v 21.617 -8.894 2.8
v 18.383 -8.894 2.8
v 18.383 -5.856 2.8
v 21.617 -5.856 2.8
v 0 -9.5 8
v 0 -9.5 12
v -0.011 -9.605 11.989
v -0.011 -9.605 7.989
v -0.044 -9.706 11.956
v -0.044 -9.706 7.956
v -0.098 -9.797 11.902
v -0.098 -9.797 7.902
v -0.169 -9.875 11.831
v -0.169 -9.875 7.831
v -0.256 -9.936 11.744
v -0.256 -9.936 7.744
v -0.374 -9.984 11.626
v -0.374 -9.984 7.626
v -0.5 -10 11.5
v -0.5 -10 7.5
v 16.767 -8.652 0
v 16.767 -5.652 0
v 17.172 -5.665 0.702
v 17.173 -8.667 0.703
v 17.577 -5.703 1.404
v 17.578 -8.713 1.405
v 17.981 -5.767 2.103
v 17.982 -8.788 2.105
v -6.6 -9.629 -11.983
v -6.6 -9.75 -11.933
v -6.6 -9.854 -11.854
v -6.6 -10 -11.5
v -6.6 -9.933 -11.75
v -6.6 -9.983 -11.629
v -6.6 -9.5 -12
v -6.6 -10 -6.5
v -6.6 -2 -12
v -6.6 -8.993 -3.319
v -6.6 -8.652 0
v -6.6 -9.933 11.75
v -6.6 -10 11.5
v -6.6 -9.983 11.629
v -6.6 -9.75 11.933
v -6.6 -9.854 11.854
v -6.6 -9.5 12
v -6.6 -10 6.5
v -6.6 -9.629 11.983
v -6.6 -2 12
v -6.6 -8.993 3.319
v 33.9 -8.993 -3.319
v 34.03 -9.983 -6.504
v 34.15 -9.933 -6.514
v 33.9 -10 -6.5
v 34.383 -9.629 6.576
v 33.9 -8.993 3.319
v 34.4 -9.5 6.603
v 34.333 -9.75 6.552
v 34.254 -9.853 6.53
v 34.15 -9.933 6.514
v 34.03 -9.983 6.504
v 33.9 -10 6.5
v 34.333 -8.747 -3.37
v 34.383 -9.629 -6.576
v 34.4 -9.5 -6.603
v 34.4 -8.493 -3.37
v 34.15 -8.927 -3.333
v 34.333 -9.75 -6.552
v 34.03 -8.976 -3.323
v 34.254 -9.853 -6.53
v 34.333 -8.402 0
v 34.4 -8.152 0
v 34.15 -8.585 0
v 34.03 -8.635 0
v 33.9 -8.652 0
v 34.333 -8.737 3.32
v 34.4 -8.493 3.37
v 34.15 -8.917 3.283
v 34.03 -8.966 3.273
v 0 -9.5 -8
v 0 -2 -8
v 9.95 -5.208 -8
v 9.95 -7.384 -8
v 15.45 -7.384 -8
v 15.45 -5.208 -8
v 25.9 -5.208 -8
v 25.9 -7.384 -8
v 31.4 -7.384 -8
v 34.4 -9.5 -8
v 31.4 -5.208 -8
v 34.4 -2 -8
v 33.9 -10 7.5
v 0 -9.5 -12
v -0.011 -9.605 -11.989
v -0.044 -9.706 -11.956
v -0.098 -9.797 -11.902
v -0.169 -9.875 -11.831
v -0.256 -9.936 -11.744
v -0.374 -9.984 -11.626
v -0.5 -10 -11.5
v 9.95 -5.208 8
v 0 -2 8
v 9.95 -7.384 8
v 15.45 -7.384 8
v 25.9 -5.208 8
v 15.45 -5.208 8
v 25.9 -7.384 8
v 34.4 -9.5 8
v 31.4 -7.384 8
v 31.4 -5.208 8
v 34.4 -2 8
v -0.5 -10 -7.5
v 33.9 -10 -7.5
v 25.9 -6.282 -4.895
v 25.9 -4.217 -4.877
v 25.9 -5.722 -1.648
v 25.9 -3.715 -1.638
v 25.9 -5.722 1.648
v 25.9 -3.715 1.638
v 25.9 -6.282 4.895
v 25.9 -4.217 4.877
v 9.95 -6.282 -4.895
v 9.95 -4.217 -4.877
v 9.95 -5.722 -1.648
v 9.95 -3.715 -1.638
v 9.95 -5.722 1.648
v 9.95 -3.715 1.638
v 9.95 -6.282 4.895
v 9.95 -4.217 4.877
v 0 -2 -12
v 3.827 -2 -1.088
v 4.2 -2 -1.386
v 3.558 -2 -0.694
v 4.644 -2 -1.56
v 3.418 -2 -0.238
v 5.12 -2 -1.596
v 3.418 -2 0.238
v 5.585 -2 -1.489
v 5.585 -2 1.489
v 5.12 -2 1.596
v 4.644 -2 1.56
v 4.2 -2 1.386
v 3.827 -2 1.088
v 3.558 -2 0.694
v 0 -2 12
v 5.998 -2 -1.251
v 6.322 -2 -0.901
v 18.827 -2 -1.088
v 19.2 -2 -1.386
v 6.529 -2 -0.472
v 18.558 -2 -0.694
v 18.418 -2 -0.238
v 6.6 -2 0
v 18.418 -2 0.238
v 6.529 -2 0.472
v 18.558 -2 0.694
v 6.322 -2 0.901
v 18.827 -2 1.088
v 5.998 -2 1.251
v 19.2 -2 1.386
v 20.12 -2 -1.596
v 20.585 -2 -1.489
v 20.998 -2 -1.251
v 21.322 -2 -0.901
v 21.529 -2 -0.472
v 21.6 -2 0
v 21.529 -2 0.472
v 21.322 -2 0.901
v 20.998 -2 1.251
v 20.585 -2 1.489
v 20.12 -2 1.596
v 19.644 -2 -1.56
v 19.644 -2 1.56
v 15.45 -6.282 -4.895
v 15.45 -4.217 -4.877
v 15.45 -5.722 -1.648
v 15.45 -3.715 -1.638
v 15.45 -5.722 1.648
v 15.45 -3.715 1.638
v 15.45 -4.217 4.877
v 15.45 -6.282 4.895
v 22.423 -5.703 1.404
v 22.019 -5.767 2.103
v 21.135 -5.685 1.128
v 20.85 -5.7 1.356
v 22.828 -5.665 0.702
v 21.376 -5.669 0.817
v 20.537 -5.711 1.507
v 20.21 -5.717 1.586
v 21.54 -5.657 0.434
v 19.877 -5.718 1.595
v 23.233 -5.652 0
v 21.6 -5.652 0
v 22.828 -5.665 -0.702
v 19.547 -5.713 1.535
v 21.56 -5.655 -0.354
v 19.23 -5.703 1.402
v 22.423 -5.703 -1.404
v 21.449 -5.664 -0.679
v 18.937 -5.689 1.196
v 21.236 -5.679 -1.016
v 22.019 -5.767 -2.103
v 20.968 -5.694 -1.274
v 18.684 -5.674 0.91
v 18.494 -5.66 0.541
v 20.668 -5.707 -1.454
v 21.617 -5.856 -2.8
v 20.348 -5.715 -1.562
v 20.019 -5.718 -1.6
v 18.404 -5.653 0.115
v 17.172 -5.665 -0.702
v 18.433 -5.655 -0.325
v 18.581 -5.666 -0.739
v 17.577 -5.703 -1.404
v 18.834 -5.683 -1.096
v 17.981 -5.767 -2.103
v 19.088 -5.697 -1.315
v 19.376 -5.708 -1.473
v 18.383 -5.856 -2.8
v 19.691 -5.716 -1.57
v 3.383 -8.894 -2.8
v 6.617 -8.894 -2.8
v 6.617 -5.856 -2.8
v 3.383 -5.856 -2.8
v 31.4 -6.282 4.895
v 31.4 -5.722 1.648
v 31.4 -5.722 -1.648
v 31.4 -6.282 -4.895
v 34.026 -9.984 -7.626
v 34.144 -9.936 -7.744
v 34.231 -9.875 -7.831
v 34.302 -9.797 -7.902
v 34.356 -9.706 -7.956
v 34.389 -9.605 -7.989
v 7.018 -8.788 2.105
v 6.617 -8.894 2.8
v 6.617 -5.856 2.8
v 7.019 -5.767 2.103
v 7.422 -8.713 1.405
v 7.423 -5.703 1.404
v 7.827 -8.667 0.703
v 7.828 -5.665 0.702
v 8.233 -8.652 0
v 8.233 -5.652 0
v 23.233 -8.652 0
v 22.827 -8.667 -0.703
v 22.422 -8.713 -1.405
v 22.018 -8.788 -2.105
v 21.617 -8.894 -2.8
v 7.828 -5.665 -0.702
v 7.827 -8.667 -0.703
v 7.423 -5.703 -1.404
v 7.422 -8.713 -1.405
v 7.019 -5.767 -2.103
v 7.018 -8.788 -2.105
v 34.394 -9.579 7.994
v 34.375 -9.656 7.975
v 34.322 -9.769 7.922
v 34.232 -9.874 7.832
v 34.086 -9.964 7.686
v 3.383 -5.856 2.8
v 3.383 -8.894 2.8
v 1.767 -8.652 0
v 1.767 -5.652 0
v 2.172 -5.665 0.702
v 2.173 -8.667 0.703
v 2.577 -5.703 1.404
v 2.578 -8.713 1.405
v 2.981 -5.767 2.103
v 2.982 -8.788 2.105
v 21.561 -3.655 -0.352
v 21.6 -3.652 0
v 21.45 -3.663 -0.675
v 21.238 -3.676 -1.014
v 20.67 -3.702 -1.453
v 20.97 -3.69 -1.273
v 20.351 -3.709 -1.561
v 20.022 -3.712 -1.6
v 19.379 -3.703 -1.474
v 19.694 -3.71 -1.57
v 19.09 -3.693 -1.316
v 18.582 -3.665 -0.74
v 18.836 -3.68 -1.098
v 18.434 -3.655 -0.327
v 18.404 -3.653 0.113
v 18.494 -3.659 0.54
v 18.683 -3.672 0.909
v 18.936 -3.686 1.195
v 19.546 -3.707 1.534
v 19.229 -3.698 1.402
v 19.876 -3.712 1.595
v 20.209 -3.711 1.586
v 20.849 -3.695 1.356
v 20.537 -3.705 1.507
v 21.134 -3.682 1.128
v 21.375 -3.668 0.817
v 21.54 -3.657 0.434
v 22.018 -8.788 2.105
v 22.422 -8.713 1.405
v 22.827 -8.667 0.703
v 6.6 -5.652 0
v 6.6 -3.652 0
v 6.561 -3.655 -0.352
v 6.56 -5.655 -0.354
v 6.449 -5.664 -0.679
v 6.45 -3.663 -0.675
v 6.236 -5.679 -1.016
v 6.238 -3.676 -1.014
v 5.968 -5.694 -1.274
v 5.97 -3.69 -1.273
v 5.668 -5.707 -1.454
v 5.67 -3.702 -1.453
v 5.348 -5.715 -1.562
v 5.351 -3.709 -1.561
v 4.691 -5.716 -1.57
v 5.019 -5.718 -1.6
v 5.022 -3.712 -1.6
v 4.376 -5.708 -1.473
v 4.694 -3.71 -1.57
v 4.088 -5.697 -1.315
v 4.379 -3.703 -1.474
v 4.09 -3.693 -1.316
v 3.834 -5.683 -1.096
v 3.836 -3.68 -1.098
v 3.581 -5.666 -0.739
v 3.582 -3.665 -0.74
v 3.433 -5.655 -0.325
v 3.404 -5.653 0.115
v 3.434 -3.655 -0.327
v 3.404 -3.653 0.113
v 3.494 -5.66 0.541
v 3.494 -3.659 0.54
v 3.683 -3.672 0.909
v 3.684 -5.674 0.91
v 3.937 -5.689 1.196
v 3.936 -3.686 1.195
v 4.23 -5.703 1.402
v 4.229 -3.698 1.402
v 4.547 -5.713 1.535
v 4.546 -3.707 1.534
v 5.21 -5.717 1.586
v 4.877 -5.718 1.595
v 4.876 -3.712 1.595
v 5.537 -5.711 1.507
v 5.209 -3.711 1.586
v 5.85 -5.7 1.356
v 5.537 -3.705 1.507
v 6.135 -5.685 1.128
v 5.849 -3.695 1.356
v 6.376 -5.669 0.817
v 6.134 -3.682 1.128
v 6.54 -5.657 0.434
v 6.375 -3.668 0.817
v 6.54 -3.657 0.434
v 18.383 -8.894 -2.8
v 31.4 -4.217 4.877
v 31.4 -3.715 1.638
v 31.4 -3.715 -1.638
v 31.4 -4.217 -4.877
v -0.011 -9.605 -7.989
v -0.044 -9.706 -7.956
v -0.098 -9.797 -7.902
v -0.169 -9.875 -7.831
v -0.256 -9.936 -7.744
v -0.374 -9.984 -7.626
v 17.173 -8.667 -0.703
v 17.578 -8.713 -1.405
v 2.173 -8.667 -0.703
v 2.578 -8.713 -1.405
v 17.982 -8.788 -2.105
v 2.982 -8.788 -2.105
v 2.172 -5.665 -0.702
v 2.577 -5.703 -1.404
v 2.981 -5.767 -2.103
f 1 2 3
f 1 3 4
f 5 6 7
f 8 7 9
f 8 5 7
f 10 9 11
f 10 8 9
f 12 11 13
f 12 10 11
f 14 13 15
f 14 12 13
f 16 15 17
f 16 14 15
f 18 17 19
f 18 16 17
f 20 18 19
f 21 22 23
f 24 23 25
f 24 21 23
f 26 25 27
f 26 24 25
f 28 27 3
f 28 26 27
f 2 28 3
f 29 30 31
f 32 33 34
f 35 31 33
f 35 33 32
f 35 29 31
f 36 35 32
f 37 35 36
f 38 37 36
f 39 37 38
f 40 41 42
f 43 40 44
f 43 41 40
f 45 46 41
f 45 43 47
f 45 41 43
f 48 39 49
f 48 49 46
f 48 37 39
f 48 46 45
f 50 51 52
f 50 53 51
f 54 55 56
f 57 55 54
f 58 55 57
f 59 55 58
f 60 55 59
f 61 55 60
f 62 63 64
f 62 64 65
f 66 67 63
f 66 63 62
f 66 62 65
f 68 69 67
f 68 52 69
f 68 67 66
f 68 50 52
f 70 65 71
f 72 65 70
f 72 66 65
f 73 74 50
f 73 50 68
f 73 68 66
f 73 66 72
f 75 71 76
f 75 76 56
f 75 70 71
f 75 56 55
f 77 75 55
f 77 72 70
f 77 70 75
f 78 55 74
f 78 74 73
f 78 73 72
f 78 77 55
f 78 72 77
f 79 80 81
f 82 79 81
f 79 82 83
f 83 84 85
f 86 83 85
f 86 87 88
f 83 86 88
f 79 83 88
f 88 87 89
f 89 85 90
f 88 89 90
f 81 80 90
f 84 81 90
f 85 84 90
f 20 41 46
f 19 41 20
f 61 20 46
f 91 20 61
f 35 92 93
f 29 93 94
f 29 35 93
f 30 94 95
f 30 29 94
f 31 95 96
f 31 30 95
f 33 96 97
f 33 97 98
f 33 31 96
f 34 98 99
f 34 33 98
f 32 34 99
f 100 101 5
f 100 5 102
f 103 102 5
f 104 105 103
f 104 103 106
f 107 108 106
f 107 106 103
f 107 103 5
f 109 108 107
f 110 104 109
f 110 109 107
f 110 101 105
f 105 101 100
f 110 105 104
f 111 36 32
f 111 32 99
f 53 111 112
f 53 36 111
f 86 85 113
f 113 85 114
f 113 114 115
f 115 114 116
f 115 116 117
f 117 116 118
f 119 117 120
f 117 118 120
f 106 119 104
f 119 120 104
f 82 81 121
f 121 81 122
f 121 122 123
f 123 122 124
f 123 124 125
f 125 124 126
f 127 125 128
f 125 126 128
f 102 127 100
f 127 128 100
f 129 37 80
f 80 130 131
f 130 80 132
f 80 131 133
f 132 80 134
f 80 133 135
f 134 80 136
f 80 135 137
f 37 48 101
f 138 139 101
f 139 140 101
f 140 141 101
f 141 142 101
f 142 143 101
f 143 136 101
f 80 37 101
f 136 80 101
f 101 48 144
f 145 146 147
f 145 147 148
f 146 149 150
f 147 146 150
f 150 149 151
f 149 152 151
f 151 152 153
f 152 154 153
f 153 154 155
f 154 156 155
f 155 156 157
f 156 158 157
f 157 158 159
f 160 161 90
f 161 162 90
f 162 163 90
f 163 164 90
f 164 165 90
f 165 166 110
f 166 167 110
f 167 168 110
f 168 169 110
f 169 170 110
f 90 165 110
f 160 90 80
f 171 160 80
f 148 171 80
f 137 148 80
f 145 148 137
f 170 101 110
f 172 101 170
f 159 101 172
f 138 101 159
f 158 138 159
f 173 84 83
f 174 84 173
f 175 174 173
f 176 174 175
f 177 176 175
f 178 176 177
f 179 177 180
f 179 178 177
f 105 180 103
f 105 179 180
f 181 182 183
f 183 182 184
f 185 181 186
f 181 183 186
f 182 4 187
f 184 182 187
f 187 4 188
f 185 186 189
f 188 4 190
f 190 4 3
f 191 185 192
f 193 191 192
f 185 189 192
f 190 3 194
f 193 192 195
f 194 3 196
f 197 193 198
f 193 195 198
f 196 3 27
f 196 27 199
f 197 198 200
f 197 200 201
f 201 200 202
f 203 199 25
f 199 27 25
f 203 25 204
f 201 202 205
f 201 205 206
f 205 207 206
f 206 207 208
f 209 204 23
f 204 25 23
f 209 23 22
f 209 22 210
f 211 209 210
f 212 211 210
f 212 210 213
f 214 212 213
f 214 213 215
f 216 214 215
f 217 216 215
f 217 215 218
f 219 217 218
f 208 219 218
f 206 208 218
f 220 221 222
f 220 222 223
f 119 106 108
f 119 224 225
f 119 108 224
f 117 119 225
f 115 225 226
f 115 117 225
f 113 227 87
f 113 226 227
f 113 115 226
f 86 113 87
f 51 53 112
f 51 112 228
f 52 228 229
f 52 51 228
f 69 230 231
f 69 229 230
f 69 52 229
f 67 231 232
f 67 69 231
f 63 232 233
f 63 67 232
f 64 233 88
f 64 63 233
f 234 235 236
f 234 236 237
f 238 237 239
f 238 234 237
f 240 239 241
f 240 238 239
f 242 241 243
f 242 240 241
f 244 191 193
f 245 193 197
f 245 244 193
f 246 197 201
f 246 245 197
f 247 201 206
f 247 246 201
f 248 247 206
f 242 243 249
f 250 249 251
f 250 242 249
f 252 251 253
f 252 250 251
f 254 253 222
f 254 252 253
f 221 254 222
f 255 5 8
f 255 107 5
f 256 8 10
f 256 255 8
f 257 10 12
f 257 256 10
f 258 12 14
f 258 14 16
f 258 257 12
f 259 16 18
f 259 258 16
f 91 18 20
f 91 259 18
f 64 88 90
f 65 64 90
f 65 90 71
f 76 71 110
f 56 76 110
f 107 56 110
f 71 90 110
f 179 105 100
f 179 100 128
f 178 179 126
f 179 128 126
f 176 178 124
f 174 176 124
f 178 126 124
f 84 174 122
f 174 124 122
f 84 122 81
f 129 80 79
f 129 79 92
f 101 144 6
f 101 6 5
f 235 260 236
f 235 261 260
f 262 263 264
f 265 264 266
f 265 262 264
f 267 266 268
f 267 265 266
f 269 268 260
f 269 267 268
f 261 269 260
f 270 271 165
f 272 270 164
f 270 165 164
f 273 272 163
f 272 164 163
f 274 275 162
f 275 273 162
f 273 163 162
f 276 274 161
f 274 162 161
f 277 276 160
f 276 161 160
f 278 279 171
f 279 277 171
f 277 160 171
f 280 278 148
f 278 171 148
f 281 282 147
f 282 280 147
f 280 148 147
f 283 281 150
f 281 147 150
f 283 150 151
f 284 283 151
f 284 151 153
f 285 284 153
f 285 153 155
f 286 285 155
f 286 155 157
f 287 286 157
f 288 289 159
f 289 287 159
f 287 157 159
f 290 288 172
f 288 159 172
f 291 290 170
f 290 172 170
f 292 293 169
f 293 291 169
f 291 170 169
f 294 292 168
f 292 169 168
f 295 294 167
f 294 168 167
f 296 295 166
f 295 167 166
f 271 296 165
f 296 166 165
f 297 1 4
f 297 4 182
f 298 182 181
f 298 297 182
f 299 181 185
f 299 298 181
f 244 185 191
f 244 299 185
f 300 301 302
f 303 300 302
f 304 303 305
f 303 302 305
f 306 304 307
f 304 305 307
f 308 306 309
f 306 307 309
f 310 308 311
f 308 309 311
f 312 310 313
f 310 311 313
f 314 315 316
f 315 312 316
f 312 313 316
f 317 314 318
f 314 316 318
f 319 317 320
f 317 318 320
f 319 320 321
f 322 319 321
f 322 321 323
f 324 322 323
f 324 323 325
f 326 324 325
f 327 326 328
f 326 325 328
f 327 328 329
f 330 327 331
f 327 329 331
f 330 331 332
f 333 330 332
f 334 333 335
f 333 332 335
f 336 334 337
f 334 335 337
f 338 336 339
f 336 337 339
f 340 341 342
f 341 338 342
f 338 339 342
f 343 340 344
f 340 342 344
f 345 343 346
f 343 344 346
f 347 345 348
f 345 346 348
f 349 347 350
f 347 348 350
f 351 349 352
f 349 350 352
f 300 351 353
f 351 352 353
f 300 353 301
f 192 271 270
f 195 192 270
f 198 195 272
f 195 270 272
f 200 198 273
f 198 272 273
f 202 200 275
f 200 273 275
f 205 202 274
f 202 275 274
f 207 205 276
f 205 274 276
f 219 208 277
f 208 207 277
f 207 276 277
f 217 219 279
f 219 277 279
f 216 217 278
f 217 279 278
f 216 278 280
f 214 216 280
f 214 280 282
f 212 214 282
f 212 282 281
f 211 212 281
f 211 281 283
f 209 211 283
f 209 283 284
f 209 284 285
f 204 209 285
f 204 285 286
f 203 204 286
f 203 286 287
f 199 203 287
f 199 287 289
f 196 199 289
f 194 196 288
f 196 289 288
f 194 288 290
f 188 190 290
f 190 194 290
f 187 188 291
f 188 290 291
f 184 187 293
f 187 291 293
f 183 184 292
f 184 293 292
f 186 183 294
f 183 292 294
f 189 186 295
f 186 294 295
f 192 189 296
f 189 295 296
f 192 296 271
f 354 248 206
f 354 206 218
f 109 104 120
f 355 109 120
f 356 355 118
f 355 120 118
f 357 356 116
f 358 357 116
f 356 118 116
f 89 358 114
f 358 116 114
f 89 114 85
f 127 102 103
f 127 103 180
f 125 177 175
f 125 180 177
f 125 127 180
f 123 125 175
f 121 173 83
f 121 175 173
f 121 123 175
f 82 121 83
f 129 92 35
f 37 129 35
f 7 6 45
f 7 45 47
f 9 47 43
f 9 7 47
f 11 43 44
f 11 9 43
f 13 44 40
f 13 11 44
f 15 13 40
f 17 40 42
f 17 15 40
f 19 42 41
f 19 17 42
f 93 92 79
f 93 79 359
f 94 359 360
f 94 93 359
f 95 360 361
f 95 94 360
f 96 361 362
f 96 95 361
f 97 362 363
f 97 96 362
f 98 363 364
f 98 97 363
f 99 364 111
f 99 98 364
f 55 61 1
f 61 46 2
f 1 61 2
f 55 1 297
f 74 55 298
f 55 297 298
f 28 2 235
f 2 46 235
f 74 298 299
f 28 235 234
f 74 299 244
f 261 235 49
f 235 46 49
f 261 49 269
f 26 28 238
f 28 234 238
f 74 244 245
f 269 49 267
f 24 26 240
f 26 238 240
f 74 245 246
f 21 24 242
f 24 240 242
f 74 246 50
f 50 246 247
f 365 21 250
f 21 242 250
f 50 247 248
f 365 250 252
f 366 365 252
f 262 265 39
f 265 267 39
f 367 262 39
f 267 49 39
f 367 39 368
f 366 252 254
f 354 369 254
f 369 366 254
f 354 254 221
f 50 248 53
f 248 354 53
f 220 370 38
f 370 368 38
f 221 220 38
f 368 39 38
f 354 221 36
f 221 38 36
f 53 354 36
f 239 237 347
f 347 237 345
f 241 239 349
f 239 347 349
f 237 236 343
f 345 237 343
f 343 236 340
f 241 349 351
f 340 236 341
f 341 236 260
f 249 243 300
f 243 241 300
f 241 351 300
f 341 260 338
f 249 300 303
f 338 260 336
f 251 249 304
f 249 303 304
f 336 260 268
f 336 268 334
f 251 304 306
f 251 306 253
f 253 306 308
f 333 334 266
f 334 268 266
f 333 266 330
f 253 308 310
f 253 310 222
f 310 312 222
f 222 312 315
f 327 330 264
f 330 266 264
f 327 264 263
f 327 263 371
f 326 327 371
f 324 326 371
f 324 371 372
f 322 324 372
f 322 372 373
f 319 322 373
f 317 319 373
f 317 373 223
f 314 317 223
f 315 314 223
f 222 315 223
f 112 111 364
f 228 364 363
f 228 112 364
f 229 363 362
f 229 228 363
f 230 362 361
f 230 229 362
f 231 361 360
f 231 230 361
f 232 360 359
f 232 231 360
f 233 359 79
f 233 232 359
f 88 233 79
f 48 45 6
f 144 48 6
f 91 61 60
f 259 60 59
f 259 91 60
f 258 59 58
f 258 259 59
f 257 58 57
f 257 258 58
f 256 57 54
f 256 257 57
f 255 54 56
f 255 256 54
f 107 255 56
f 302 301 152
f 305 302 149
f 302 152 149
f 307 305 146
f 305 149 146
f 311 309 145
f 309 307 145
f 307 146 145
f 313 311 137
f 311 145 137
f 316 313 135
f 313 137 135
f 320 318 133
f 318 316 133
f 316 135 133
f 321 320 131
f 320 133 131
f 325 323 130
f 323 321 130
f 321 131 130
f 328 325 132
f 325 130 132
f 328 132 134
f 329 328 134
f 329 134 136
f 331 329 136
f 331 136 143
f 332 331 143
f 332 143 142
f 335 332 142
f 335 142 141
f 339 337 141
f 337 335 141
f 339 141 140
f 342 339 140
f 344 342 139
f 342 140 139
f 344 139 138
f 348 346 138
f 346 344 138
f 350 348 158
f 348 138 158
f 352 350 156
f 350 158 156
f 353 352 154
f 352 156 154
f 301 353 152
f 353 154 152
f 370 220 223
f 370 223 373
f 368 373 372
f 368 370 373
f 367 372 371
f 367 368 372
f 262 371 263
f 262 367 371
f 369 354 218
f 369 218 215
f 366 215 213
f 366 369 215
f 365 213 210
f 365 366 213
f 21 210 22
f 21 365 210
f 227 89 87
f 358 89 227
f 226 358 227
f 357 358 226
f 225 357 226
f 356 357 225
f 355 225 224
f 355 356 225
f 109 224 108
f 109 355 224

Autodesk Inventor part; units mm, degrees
ref_plane "YZ Plane" through (0, 0, 0) normal (1, 0, 0) x (0, 1, 0)
ref_plane "XZ Plane" through (0, 0, 0) normal (0, 1, 0) x (-1, 0, 0)
ref_plane "XY Plane" through (0, 0, 0) normal (0, 0, 1) x (1, 0, 0)
ref_plane "Arbeitsebene1" through (-0.5, 0, -8) normal (0, -1, 0) x (1, 0, 0)
sketch "Skizze1" plane through (-0.5, 0, -8) normal (0, -1, 0) x (1, 0, 0)
  line L0 (-6.1, 20) -> (0.5, 20)
  line L1 (0.5, 20) -> (0.5, -4)
  line L2 (0.5, -4) -> (-6.1, -4)
  line L3 (-6.1, -4) -> (-6.1, 20)
  line L4 (0.5, 0) -> (32.9, 0) projected
  line L5 (0.5, 16) -> (34.9, 16) projected
  line L6 (0.5, 0) -> (34.9, 0)
  line L7 (34.9, 0) -> (34.9, 16)
  line L8 (34.9, 16) -> (0.5, 16)
  line L9 (0.5, 16) -> (0.5, 0)
  circle A0 centre (5.5, 8) radius 1.6 projected
  circle A1 centre (5.5, 8) radius 1.6
  circle A2 centre (20.5, 8) radius 1.6 projected
  circle A3 centre (20.5, 8) radius 1.6
  circle A4 centre (5.5, 8) radius 2.75
  circle A5 centre (20.5, 8) radius 2.75
  point P0 (0.5, 8)
  dimension "d0" = 5.5
  dimension "d1" = 5.5
extrude "Extrusion1" add sketch "Skizze1" along normal blind 10 contours L0 L1 L2 L3 | L5 L7 L6 L4 L1 | A4 | A5
ref_plane "Arbeitsebene2" through (-6.6, 0, -12) normal (-1, 0, 0) x (0, 0, 1)
sketch "Skizze2" plane through (-6.6, 0, -12) normal (-1, 0, 0) x (0, 0, 1)
  line L0 (0, -10) -> (4, -10) projected
  line L1 (0, -10) -> (24, -10)
  line L2 (24, -10) -> (24, -25)
  line L3 (24, -25) -> (0, -25)
  line L4 (0, -25) -> (0, -10)
  line L5 (0, 0) -> (0, -10) projected
  line L6 (0, 0) -> (4, 0) projected
  line L7 (0, -10) -> (2, -10)
  line L8 (2, -10) -> (2, 0)
  line L9 (2, 0) -> (0, 0)
  line L10 (0, 0) -> (0, -10)
  line L11 (4, 0) -> (4, -10) projected
  line L12 (4, -10) -> (20, -10)
  line L13 (20, -10) -> (20, -20)
  line L14 (20, -20) -> (4, -20)
  line L15 (4, -20) -> (4, -10)
  line L16 (4, -10) -> (5.5, -10)
  line L17 (5.5, -10) -> (5.5, -20)
  line L18 (5.5, -20) -> (4, -20)
  line L19 (4, -20) -> (4, -10)
  circle A0 centre (12, -25) radius 16.3478
  line L20 (12, -8.6522) -> (12, -5.6522)
  line L21 (12, -5.6522) -> (12, -3.6522)
  circle A1 centre (12, -25) radius 19.3478
  circle A2 centre (12, -25) radius 21.3478
  line L22 (4, -20) -> (20, -20)
  line L23 (20, -20) -> (20, 0)
  line L24 (20, 0) -> (4, 0)
  line L25 (4, 0) -> (4, -20)
  point P0 (12, 0)
  point P1 (18.5, -10)
  point P2 (20, -7.3836)
  point P3 (20, -5.2079)
  point P4 (4, -5.2079)
  point P5 (4, -7.3836)
  dimension "d4" = 15
  dimension "d5" = 16
  dimension "d6" = 10
  dimension "d7" = 1.5
  dimension "d14" = 3
  dimension "d15" = 2
extrude "Extrusion2" cut sketch "Skizze2" against normal up to surface (41 mm away) contours A0 L1
sketch "Skizze4" plane through (-0.5, -10, -8) normal (0, -1, 0) x (1, 0, 0)
  circle A0 centre (20.5, 8) radius 1.6 projected
  circle A1 centre (20.5, 8) radius 2.8
  circle A2 centre (5.5, 8) radius 1.6 projected
  circle A3 centre (5.5, 8) radius 2.8
  line L0 (7.1166, 10.8) -> (8.7332, 8)
  line L1 (8.7332, 8) -> (7.1166, 5.2)
  line L2 (7.1166, 5.2) -> (3.8834, 5.2)
  line L3 (3.8834, 5.2) -> (2.2668, 8)
  line L4 (2.2668, 8) -> (3.8834, 10.8)
  line L5 (3.8834, 10.8) -> (7.1166, 10.8)
  line L6 (22.1166, 10.8) -> (23.7332, 8)
  line L7 (23.7332, 8) -> (22.1166, 5.2)
  line L8 (22.1166, 5.2) -> (18.8834, 5.2)
  line L9 (18.8834, 5.2) -> (17.2668, 8)
  line L10 (17.2668, 8) -> (18.8834, 10.8)
  line L11 (18.8834, 10.8) -> (22.1166, 10.8)
  point P0 (0.5, 8)
  point P1 (5.5, 10.8)
  point P2 (20.5, 10.8)
  dimension "d29" = 5.6
  dimension "d30" = 5.6
extrude "Extrusion3" cut sketch "Skizze4" against normal blind 5 contours A0 | A1 | A1 L6 L7 | A1 L11 L6 | L7 L8 A1 | A1 L10 L11 | L8 L9 A1 | A1 L9 L10 | A2 | A3 | A3 L0 L1 | A3 L5 L0 | L1 L2 A3 | A3 L4 L5 | L2 L3 A3 | A3 L3 L4
extrude "Extrusion4" cut sketch "Skizze2" against normal blind 38 contours L11 A2 L21 A1 | A1 L21 A2 L23
extrude "Extrusion5" add sketch "Skizze2" against normal blind 32.5 contours L11 A2 L21 A1 | A1 L21 A2 L23
extrude "Extrusion6" cut sketch "Skizze2" against normal blind 22.05 contours L11 A2 L21 A1 | A1 L21 A2 L23
extrude "Extrusion7" add sketch "Skizze2" against normal blind 16.55 contours L11 A2 L21 A1 | A1 L21 A2 L23
extrude "Extrusion8" cut sketch "Skizze1" along normal blind 16.55 contours A0 | A2
extrude "Extrusion9" cut sketch "Skizze1" along normal blind 2 contours L0 L1 L2 L3 | L5 L7 L6 L4 L1 | A4 | A5
fillet "Rundung1" radius 0.5 9 edges at (-3.3, -10, 12) (0, -10, 10) (17.2, -10, 8) (34.4, -10, 7.25) (34.4, -8.6522, 0) (34.4, -10, -7.25) (17.2, -10, -8) (0, -10, -10) (-3.3, -10, -12)
properties part number "OBS-Displaymountadapter"
